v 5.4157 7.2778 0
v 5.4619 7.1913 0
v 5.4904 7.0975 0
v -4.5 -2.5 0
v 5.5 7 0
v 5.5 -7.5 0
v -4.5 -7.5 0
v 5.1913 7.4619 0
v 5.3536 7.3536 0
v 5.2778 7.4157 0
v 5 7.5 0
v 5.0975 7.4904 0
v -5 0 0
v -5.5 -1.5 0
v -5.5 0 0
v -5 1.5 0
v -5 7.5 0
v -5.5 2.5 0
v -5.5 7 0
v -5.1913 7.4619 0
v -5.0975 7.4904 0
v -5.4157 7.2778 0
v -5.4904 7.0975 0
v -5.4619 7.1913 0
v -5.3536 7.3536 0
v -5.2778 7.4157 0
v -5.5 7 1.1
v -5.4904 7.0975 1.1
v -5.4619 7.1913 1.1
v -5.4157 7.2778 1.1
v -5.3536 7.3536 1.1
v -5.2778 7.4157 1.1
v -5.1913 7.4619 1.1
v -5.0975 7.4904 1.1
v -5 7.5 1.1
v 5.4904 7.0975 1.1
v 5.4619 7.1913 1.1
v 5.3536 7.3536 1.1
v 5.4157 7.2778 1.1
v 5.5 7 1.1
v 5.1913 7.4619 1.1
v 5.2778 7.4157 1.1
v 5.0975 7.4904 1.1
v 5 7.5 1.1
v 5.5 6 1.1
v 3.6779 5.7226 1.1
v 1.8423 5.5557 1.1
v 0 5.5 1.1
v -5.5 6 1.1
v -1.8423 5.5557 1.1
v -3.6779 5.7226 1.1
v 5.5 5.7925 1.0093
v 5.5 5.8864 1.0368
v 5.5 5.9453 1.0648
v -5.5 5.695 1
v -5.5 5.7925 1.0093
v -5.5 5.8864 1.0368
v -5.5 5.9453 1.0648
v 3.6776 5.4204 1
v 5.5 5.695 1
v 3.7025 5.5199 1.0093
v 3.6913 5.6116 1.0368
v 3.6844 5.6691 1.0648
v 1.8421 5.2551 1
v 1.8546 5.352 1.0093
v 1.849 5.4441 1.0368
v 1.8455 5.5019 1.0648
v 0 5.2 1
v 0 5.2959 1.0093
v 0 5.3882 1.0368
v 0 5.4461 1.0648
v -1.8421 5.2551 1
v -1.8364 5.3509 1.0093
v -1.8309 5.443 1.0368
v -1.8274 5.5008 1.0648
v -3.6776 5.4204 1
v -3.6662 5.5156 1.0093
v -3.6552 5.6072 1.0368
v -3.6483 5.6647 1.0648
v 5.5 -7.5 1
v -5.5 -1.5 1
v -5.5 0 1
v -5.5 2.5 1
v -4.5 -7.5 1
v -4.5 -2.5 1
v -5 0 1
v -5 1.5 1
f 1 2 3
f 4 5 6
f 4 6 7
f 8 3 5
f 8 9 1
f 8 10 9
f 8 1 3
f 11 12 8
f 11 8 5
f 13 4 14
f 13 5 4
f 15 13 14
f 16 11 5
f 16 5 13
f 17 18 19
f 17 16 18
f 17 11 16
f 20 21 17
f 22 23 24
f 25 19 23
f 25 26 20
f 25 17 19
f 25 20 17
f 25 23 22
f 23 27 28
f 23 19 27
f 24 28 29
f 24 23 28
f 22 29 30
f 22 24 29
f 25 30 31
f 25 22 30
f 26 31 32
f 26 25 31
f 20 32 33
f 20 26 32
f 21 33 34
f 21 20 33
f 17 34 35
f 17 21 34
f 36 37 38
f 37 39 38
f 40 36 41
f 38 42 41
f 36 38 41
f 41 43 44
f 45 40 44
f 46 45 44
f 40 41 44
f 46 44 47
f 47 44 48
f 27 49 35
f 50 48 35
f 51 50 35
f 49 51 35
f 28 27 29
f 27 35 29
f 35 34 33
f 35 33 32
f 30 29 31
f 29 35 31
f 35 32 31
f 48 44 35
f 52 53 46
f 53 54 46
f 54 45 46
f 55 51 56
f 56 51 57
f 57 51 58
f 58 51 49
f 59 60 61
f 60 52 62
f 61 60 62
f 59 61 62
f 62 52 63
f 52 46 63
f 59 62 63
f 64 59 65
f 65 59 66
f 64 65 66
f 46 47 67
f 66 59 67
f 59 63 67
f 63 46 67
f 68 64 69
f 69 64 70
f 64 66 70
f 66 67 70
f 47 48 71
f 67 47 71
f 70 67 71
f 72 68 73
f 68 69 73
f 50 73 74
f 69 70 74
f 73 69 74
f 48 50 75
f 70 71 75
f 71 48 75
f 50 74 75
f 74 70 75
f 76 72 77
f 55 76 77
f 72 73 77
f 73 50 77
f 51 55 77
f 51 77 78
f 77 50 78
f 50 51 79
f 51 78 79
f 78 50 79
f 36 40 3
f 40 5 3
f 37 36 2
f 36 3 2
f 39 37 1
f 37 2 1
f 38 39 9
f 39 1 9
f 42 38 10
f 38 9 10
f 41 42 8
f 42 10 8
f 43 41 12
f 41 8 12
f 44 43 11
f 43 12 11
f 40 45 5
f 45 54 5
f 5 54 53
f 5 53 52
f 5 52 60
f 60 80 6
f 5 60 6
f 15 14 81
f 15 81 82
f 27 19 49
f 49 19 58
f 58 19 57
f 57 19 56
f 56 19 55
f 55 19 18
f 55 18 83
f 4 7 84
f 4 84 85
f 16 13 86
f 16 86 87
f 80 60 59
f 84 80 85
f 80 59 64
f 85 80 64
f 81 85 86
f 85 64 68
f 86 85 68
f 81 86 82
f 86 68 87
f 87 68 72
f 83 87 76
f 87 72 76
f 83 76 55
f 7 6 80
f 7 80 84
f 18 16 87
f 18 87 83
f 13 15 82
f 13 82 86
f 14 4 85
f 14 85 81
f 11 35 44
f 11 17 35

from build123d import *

# Parameters (mm, degrees)
EXTRUDE_1_DEPTH = 1
EXTRUDE_2_DEPTH = 0.1
FILLET_1_R      = 0.5
FILLET_2_R      = 0.5


with BuildPart() as part:
    # 草图1 → 凸台-拉伸1 (new body)
    with BuildSketch(Plane.XY):
        Polygon((-5, 0), (-5, 1.5), (-5.5, 2.5), (-5.5, 7.5), (5.5, 7.5), (5.5, -7.5), (-4.5, -7.5), (-4.5, -2.5), (-5.5, -1.5), (-5.5, 0), align=None)
    extrude(amount=EXTRUDE_1_DEPTH)

    # 草图2 → 凸台-拉伸2 (add)
    with BuildSketch(Plane.XY.offset(1)):
        with BuildLine():
            Line((-5.5, 6), (-5.5, 7.5))
            Line((-5.5, 7.5), (5.5, 7.5))
            Line((5.5, 7.5), (5.5, 6))
            ThreePointArc((5.5, 6), (0, 5.5), (-5.5, 6))
        make_face()
    extrude(amount=EXTRUDE_2_DEPTH)

    # 圆角1
    # the kernel refuses this fillet: 0.5 mm, written as the material it adds along each edge
    with BuildSketch(Plane(origin=(0, 36, 1), x_dir=(0.20445847585132765, -0.9788752380423933, 0), z_dir=(0.9788752380423933, 0.20445847585132765, 0))) as fillet_1_piece_1_section:
        with BuildLine():
            CenterArc((30.8, -0.5), FILLET_1_R, 90, 36.869897646)
            Line((30.5, -0.1), (30.5, 0))
            Line((30.5, 0), (30.8, 0))
        make_face()
    fillet_1_piece_1 = revolve(axis=Axis((0, 36, 1), (0, 0, -1)), revolution_arc=23.595601167, mode=Mode.PRIVATE)
    fillet_1_piece_1 = split(fillet_1_piece_1, bisect_by=Plane(origin=(-5.5, 5.358430111, 1.024709668), z_dir=(1, 0, 0)), keep=Keep.TOP, mode=Mode.PRIVATE)
    fillet_1_piece_1 = split(fillet_1_piece_1, bisect_by=Plane(origin=(5.5, 5.358430111, 1.024709668), z_dir=(-1, 0, 0)), keep=Keep.TOP, mode=Mode.PRIVATE)
    add(fillet_1_piece_1)

    # 圆角2
    fillet_2_edges = [part.edges().sort_by_distance(p)[0] for p in [
        (-5.5, 7.5, 0.55),
        (5.5, 7.5, 0.55),
    ]]
    fillet(fillet_2_edges, radius=FILLET_2_R)


solid = part.part
